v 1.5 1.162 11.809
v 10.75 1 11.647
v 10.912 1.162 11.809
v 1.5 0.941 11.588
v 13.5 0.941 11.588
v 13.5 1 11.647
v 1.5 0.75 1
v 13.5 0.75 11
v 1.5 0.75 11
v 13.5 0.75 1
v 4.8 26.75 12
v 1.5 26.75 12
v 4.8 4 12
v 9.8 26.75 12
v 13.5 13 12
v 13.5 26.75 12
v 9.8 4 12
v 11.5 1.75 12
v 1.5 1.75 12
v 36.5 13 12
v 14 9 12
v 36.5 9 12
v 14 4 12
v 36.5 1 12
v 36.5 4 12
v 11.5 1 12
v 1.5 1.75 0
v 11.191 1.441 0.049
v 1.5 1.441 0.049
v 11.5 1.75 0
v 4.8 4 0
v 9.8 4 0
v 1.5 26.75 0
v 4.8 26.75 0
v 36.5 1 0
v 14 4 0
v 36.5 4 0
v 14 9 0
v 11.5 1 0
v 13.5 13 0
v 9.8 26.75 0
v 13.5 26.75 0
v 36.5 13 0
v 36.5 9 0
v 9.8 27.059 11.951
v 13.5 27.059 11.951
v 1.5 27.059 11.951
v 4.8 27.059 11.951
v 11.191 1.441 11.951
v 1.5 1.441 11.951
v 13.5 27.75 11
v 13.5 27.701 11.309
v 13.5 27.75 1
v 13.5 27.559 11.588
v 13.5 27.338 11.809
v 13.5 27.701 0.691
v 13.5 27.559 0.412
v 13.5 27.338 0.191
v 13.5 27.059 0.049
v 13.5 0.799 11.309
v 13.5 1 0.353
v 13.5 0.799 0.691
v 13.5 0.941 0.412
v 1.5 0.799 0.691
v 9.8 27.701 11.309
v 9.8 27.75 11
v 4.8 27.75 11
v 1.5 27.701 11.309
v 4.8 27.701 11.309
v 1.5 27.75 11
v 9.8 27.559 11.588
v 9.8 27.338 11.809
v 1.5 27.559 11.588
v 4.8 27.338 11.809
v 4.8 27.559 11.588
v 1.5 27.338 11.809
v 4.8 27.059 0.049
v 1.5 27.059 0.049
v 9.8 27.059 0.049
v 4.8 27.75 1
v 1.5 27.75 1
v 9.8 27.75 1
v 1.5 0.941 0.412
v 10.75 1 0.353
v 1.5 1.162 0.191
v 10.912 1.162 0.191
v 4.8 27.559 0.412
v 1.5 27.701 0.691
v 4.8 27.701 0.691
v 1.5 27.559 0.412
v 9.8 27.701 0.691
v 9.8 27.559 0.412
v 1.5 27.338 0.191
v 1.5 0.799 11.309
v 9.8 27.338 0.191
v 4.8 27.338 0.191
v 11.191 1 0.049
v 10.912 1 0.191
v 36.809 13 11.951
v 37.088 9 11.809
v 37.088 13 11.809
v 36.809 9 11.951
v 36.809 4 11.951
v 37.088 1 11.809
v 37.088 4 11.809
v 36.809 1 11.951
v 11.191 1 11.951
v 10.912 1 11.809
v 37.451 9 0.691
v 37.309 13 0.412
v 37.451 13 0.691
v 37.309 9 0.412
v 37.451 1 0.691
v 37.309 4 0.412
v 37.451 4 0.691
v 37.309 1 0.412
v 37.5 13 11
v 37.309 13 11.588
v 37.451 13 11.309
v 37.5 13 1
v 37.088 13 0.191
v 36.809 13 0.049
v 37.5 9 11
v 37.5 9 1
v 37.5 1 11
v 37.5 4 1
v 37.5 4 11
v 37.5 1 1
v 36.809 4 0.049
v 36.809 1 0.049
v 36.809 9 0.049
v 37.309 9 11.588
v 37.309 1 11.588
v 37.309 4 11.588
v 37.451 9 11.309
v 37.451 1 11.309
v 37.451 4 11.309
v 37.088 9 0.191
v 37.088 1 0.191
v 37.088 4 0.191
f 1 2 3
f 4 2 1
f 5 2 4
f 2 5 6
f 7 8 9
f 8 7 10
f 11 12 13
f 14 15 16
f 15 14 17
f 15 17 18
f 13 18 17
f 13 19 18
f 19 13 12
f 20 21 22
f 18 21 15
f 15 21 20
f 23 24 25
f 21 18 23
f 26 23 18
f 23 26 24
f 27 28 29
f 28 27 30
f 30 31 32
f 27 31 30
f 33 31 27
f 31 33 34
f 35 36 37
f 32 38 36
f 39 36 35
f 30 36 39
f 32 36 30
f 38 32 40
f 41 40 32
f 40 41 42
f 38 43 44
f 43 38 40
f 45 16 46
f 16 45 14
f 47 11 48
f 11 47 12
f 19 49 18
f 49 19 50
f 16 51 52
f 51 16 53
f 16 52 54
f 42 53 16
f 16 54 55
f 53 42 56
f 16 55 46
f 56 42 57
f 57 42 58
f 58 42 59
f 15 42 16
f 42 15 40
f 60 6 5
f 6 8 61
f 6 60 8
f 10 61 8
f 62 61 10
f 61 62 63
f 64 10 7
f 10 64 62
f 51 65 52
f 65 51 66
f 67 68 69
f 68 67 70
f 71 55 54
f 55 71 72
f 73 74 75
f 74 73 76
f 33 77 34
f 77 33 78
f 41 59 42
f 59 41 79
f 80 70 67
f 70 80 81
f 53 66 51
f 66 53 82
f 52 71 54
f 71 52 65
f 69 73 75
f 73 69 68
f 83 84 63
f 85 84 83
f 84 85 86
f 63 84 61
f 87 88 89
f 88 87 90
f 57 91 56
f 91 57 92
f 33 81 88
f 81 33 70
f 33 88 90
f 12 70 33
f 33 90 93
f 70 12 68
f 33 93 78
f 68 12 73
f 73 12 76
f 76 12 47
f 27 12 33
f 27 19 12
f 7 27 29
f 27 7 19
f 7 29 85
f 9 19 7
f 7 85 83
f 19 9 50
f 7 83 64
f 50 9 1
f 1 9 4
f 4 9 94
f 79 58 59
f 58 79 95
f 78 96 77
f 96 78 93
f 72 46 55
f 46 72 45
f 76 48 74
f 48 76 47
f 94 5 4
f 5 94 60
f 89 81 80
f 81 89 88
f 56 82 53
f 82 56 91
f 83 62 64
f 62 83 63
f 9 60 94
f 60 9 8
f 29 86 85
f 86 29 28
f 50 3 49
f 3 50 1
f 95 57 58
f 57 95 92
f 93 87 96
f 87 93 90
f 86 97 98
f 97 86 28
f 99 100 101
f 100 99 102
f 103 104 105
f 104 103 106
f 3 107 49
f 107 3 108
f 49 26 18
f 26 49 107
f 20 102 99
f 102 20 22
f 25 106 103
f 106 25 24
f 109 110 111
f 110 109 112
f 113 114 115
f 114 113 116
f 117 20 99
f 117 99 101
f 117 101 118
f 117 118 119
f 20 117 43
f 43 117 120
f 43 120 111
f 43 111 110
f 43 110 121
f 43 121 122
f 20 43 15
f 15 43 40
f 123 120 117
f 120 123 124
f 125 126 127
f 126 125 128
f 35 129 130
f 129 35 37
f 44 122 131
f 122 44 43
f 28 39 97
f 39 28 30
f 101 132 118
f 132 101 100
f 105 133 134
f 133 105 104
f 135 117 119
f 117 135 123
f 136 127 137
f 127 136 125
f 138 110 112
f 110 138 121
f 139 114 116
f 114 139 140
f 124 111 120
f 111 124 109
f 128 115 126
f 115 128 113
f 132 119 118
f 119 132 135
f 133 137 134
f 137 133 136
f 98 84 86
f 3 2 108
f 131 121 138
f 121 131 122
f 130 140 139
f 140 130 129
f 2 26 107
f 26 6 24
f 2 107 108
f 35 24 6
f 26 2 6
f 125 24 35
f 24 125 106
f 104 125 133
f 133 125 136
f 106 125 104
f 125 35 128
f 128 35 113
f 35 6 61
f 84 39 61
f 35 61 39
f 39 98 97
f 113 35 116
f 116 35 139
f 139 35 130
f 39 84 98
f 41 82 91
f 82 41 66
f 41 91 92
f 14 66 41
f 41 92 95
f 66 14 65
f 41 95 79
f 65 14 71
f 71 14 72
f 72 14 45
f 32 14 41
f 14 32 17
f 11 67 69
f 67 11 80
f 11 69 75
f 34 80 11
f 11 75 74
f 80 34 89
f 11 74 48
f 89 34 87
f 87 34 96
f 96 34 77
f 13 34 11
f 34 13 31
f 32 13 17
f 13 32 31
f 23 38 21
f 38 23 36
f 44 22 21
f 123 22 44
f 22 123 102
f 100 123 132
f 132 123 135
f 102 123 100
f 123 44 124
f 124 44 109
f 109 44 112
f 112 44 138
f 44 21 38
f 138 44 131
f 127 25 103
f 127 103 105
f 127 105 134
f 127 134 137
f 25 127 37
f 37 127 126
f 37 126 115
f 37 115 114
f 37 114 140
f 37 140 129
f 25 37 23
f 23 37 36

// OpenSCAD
/*************************************************/
/* Foam board connectors Customizer Version v2   */
/* Two different sizes:                          */ 
/*   - Foam to Foamfor plywood                   */
/*   - Foam to plywood table top ( 7/16" )       */
/* By Cpayne3d - 2015/2019                       */
/* Creative commons - Non-Commercial Share Alike */
/*************************************************/

plywood_thick = 11 +0;         // plywood/tabletop thickness value ( 11mm = 7/16" )
foam_thick = 4.9 +0;           // foam board thickness value       ( 4.9mm = common foam board)

/* [Settings] */
// Width of Red side (def 5)
Red_Side_Width = 5;    //[3:20]   

// Width of Green side (def 5)
Green_Side_Width = 5;    //[3:20]   

// Customize the thickness (def 10)
Connector_Thickness = 10; //[2:25]

// Customize offset lengths (def 0)
Connector_Length_Offset = 0; //[0:5]

//rotate([0, 270, 0])
  custom_connector();


module custom_connector() {
armwid = 3;
translate([Red_Side_Width + armwid*2, 1, 0])     
difference() {
translate([0, 1, 1])
   union() {
       
//translate([0, 0, -(Red_Side_Width +7)])
translate([-(Red_Side_Width + armwid * 1.5 ), -0.25, 0])
color("Red") 
  minkowski() { 
   cube([Red_Side_Width + armwid*2, 25 + Connector_Length_Offset, Connector_Thickness]); // red cube
     rotate([0, 90, 0]) cylinder(h=1, r=1, $fn=20); 
    }

translate([0.5, -1, 0]) 
 color("Green")  minkowski() { 
   cube([25 + Connector_Length_Offset, Green_Side_Width +armwid*2, Connector_Thickness]); // green cube
   rotate([0, 90, 90]) cylinder(h=1, r=1, $fn=20); 
    }

 } // //end union


union() {
// translate([3.5, 3, -2]) 
 translate([-(Red_Side_Width + armwid/2.5), 3, -2]) 
  color("Red") cube([Red_Side_Width, 25 + Connector_Length_Offset, Connector_Thickness +armwid*2]);  // trim red core

 translate([armwid, armwid, -1]) cube([25 + Connector_Length_Offset, Green_Side_Width, Connector_Thickness +armwid*2]); // trim green core
 }  // end union

} // end difference

} // end module
